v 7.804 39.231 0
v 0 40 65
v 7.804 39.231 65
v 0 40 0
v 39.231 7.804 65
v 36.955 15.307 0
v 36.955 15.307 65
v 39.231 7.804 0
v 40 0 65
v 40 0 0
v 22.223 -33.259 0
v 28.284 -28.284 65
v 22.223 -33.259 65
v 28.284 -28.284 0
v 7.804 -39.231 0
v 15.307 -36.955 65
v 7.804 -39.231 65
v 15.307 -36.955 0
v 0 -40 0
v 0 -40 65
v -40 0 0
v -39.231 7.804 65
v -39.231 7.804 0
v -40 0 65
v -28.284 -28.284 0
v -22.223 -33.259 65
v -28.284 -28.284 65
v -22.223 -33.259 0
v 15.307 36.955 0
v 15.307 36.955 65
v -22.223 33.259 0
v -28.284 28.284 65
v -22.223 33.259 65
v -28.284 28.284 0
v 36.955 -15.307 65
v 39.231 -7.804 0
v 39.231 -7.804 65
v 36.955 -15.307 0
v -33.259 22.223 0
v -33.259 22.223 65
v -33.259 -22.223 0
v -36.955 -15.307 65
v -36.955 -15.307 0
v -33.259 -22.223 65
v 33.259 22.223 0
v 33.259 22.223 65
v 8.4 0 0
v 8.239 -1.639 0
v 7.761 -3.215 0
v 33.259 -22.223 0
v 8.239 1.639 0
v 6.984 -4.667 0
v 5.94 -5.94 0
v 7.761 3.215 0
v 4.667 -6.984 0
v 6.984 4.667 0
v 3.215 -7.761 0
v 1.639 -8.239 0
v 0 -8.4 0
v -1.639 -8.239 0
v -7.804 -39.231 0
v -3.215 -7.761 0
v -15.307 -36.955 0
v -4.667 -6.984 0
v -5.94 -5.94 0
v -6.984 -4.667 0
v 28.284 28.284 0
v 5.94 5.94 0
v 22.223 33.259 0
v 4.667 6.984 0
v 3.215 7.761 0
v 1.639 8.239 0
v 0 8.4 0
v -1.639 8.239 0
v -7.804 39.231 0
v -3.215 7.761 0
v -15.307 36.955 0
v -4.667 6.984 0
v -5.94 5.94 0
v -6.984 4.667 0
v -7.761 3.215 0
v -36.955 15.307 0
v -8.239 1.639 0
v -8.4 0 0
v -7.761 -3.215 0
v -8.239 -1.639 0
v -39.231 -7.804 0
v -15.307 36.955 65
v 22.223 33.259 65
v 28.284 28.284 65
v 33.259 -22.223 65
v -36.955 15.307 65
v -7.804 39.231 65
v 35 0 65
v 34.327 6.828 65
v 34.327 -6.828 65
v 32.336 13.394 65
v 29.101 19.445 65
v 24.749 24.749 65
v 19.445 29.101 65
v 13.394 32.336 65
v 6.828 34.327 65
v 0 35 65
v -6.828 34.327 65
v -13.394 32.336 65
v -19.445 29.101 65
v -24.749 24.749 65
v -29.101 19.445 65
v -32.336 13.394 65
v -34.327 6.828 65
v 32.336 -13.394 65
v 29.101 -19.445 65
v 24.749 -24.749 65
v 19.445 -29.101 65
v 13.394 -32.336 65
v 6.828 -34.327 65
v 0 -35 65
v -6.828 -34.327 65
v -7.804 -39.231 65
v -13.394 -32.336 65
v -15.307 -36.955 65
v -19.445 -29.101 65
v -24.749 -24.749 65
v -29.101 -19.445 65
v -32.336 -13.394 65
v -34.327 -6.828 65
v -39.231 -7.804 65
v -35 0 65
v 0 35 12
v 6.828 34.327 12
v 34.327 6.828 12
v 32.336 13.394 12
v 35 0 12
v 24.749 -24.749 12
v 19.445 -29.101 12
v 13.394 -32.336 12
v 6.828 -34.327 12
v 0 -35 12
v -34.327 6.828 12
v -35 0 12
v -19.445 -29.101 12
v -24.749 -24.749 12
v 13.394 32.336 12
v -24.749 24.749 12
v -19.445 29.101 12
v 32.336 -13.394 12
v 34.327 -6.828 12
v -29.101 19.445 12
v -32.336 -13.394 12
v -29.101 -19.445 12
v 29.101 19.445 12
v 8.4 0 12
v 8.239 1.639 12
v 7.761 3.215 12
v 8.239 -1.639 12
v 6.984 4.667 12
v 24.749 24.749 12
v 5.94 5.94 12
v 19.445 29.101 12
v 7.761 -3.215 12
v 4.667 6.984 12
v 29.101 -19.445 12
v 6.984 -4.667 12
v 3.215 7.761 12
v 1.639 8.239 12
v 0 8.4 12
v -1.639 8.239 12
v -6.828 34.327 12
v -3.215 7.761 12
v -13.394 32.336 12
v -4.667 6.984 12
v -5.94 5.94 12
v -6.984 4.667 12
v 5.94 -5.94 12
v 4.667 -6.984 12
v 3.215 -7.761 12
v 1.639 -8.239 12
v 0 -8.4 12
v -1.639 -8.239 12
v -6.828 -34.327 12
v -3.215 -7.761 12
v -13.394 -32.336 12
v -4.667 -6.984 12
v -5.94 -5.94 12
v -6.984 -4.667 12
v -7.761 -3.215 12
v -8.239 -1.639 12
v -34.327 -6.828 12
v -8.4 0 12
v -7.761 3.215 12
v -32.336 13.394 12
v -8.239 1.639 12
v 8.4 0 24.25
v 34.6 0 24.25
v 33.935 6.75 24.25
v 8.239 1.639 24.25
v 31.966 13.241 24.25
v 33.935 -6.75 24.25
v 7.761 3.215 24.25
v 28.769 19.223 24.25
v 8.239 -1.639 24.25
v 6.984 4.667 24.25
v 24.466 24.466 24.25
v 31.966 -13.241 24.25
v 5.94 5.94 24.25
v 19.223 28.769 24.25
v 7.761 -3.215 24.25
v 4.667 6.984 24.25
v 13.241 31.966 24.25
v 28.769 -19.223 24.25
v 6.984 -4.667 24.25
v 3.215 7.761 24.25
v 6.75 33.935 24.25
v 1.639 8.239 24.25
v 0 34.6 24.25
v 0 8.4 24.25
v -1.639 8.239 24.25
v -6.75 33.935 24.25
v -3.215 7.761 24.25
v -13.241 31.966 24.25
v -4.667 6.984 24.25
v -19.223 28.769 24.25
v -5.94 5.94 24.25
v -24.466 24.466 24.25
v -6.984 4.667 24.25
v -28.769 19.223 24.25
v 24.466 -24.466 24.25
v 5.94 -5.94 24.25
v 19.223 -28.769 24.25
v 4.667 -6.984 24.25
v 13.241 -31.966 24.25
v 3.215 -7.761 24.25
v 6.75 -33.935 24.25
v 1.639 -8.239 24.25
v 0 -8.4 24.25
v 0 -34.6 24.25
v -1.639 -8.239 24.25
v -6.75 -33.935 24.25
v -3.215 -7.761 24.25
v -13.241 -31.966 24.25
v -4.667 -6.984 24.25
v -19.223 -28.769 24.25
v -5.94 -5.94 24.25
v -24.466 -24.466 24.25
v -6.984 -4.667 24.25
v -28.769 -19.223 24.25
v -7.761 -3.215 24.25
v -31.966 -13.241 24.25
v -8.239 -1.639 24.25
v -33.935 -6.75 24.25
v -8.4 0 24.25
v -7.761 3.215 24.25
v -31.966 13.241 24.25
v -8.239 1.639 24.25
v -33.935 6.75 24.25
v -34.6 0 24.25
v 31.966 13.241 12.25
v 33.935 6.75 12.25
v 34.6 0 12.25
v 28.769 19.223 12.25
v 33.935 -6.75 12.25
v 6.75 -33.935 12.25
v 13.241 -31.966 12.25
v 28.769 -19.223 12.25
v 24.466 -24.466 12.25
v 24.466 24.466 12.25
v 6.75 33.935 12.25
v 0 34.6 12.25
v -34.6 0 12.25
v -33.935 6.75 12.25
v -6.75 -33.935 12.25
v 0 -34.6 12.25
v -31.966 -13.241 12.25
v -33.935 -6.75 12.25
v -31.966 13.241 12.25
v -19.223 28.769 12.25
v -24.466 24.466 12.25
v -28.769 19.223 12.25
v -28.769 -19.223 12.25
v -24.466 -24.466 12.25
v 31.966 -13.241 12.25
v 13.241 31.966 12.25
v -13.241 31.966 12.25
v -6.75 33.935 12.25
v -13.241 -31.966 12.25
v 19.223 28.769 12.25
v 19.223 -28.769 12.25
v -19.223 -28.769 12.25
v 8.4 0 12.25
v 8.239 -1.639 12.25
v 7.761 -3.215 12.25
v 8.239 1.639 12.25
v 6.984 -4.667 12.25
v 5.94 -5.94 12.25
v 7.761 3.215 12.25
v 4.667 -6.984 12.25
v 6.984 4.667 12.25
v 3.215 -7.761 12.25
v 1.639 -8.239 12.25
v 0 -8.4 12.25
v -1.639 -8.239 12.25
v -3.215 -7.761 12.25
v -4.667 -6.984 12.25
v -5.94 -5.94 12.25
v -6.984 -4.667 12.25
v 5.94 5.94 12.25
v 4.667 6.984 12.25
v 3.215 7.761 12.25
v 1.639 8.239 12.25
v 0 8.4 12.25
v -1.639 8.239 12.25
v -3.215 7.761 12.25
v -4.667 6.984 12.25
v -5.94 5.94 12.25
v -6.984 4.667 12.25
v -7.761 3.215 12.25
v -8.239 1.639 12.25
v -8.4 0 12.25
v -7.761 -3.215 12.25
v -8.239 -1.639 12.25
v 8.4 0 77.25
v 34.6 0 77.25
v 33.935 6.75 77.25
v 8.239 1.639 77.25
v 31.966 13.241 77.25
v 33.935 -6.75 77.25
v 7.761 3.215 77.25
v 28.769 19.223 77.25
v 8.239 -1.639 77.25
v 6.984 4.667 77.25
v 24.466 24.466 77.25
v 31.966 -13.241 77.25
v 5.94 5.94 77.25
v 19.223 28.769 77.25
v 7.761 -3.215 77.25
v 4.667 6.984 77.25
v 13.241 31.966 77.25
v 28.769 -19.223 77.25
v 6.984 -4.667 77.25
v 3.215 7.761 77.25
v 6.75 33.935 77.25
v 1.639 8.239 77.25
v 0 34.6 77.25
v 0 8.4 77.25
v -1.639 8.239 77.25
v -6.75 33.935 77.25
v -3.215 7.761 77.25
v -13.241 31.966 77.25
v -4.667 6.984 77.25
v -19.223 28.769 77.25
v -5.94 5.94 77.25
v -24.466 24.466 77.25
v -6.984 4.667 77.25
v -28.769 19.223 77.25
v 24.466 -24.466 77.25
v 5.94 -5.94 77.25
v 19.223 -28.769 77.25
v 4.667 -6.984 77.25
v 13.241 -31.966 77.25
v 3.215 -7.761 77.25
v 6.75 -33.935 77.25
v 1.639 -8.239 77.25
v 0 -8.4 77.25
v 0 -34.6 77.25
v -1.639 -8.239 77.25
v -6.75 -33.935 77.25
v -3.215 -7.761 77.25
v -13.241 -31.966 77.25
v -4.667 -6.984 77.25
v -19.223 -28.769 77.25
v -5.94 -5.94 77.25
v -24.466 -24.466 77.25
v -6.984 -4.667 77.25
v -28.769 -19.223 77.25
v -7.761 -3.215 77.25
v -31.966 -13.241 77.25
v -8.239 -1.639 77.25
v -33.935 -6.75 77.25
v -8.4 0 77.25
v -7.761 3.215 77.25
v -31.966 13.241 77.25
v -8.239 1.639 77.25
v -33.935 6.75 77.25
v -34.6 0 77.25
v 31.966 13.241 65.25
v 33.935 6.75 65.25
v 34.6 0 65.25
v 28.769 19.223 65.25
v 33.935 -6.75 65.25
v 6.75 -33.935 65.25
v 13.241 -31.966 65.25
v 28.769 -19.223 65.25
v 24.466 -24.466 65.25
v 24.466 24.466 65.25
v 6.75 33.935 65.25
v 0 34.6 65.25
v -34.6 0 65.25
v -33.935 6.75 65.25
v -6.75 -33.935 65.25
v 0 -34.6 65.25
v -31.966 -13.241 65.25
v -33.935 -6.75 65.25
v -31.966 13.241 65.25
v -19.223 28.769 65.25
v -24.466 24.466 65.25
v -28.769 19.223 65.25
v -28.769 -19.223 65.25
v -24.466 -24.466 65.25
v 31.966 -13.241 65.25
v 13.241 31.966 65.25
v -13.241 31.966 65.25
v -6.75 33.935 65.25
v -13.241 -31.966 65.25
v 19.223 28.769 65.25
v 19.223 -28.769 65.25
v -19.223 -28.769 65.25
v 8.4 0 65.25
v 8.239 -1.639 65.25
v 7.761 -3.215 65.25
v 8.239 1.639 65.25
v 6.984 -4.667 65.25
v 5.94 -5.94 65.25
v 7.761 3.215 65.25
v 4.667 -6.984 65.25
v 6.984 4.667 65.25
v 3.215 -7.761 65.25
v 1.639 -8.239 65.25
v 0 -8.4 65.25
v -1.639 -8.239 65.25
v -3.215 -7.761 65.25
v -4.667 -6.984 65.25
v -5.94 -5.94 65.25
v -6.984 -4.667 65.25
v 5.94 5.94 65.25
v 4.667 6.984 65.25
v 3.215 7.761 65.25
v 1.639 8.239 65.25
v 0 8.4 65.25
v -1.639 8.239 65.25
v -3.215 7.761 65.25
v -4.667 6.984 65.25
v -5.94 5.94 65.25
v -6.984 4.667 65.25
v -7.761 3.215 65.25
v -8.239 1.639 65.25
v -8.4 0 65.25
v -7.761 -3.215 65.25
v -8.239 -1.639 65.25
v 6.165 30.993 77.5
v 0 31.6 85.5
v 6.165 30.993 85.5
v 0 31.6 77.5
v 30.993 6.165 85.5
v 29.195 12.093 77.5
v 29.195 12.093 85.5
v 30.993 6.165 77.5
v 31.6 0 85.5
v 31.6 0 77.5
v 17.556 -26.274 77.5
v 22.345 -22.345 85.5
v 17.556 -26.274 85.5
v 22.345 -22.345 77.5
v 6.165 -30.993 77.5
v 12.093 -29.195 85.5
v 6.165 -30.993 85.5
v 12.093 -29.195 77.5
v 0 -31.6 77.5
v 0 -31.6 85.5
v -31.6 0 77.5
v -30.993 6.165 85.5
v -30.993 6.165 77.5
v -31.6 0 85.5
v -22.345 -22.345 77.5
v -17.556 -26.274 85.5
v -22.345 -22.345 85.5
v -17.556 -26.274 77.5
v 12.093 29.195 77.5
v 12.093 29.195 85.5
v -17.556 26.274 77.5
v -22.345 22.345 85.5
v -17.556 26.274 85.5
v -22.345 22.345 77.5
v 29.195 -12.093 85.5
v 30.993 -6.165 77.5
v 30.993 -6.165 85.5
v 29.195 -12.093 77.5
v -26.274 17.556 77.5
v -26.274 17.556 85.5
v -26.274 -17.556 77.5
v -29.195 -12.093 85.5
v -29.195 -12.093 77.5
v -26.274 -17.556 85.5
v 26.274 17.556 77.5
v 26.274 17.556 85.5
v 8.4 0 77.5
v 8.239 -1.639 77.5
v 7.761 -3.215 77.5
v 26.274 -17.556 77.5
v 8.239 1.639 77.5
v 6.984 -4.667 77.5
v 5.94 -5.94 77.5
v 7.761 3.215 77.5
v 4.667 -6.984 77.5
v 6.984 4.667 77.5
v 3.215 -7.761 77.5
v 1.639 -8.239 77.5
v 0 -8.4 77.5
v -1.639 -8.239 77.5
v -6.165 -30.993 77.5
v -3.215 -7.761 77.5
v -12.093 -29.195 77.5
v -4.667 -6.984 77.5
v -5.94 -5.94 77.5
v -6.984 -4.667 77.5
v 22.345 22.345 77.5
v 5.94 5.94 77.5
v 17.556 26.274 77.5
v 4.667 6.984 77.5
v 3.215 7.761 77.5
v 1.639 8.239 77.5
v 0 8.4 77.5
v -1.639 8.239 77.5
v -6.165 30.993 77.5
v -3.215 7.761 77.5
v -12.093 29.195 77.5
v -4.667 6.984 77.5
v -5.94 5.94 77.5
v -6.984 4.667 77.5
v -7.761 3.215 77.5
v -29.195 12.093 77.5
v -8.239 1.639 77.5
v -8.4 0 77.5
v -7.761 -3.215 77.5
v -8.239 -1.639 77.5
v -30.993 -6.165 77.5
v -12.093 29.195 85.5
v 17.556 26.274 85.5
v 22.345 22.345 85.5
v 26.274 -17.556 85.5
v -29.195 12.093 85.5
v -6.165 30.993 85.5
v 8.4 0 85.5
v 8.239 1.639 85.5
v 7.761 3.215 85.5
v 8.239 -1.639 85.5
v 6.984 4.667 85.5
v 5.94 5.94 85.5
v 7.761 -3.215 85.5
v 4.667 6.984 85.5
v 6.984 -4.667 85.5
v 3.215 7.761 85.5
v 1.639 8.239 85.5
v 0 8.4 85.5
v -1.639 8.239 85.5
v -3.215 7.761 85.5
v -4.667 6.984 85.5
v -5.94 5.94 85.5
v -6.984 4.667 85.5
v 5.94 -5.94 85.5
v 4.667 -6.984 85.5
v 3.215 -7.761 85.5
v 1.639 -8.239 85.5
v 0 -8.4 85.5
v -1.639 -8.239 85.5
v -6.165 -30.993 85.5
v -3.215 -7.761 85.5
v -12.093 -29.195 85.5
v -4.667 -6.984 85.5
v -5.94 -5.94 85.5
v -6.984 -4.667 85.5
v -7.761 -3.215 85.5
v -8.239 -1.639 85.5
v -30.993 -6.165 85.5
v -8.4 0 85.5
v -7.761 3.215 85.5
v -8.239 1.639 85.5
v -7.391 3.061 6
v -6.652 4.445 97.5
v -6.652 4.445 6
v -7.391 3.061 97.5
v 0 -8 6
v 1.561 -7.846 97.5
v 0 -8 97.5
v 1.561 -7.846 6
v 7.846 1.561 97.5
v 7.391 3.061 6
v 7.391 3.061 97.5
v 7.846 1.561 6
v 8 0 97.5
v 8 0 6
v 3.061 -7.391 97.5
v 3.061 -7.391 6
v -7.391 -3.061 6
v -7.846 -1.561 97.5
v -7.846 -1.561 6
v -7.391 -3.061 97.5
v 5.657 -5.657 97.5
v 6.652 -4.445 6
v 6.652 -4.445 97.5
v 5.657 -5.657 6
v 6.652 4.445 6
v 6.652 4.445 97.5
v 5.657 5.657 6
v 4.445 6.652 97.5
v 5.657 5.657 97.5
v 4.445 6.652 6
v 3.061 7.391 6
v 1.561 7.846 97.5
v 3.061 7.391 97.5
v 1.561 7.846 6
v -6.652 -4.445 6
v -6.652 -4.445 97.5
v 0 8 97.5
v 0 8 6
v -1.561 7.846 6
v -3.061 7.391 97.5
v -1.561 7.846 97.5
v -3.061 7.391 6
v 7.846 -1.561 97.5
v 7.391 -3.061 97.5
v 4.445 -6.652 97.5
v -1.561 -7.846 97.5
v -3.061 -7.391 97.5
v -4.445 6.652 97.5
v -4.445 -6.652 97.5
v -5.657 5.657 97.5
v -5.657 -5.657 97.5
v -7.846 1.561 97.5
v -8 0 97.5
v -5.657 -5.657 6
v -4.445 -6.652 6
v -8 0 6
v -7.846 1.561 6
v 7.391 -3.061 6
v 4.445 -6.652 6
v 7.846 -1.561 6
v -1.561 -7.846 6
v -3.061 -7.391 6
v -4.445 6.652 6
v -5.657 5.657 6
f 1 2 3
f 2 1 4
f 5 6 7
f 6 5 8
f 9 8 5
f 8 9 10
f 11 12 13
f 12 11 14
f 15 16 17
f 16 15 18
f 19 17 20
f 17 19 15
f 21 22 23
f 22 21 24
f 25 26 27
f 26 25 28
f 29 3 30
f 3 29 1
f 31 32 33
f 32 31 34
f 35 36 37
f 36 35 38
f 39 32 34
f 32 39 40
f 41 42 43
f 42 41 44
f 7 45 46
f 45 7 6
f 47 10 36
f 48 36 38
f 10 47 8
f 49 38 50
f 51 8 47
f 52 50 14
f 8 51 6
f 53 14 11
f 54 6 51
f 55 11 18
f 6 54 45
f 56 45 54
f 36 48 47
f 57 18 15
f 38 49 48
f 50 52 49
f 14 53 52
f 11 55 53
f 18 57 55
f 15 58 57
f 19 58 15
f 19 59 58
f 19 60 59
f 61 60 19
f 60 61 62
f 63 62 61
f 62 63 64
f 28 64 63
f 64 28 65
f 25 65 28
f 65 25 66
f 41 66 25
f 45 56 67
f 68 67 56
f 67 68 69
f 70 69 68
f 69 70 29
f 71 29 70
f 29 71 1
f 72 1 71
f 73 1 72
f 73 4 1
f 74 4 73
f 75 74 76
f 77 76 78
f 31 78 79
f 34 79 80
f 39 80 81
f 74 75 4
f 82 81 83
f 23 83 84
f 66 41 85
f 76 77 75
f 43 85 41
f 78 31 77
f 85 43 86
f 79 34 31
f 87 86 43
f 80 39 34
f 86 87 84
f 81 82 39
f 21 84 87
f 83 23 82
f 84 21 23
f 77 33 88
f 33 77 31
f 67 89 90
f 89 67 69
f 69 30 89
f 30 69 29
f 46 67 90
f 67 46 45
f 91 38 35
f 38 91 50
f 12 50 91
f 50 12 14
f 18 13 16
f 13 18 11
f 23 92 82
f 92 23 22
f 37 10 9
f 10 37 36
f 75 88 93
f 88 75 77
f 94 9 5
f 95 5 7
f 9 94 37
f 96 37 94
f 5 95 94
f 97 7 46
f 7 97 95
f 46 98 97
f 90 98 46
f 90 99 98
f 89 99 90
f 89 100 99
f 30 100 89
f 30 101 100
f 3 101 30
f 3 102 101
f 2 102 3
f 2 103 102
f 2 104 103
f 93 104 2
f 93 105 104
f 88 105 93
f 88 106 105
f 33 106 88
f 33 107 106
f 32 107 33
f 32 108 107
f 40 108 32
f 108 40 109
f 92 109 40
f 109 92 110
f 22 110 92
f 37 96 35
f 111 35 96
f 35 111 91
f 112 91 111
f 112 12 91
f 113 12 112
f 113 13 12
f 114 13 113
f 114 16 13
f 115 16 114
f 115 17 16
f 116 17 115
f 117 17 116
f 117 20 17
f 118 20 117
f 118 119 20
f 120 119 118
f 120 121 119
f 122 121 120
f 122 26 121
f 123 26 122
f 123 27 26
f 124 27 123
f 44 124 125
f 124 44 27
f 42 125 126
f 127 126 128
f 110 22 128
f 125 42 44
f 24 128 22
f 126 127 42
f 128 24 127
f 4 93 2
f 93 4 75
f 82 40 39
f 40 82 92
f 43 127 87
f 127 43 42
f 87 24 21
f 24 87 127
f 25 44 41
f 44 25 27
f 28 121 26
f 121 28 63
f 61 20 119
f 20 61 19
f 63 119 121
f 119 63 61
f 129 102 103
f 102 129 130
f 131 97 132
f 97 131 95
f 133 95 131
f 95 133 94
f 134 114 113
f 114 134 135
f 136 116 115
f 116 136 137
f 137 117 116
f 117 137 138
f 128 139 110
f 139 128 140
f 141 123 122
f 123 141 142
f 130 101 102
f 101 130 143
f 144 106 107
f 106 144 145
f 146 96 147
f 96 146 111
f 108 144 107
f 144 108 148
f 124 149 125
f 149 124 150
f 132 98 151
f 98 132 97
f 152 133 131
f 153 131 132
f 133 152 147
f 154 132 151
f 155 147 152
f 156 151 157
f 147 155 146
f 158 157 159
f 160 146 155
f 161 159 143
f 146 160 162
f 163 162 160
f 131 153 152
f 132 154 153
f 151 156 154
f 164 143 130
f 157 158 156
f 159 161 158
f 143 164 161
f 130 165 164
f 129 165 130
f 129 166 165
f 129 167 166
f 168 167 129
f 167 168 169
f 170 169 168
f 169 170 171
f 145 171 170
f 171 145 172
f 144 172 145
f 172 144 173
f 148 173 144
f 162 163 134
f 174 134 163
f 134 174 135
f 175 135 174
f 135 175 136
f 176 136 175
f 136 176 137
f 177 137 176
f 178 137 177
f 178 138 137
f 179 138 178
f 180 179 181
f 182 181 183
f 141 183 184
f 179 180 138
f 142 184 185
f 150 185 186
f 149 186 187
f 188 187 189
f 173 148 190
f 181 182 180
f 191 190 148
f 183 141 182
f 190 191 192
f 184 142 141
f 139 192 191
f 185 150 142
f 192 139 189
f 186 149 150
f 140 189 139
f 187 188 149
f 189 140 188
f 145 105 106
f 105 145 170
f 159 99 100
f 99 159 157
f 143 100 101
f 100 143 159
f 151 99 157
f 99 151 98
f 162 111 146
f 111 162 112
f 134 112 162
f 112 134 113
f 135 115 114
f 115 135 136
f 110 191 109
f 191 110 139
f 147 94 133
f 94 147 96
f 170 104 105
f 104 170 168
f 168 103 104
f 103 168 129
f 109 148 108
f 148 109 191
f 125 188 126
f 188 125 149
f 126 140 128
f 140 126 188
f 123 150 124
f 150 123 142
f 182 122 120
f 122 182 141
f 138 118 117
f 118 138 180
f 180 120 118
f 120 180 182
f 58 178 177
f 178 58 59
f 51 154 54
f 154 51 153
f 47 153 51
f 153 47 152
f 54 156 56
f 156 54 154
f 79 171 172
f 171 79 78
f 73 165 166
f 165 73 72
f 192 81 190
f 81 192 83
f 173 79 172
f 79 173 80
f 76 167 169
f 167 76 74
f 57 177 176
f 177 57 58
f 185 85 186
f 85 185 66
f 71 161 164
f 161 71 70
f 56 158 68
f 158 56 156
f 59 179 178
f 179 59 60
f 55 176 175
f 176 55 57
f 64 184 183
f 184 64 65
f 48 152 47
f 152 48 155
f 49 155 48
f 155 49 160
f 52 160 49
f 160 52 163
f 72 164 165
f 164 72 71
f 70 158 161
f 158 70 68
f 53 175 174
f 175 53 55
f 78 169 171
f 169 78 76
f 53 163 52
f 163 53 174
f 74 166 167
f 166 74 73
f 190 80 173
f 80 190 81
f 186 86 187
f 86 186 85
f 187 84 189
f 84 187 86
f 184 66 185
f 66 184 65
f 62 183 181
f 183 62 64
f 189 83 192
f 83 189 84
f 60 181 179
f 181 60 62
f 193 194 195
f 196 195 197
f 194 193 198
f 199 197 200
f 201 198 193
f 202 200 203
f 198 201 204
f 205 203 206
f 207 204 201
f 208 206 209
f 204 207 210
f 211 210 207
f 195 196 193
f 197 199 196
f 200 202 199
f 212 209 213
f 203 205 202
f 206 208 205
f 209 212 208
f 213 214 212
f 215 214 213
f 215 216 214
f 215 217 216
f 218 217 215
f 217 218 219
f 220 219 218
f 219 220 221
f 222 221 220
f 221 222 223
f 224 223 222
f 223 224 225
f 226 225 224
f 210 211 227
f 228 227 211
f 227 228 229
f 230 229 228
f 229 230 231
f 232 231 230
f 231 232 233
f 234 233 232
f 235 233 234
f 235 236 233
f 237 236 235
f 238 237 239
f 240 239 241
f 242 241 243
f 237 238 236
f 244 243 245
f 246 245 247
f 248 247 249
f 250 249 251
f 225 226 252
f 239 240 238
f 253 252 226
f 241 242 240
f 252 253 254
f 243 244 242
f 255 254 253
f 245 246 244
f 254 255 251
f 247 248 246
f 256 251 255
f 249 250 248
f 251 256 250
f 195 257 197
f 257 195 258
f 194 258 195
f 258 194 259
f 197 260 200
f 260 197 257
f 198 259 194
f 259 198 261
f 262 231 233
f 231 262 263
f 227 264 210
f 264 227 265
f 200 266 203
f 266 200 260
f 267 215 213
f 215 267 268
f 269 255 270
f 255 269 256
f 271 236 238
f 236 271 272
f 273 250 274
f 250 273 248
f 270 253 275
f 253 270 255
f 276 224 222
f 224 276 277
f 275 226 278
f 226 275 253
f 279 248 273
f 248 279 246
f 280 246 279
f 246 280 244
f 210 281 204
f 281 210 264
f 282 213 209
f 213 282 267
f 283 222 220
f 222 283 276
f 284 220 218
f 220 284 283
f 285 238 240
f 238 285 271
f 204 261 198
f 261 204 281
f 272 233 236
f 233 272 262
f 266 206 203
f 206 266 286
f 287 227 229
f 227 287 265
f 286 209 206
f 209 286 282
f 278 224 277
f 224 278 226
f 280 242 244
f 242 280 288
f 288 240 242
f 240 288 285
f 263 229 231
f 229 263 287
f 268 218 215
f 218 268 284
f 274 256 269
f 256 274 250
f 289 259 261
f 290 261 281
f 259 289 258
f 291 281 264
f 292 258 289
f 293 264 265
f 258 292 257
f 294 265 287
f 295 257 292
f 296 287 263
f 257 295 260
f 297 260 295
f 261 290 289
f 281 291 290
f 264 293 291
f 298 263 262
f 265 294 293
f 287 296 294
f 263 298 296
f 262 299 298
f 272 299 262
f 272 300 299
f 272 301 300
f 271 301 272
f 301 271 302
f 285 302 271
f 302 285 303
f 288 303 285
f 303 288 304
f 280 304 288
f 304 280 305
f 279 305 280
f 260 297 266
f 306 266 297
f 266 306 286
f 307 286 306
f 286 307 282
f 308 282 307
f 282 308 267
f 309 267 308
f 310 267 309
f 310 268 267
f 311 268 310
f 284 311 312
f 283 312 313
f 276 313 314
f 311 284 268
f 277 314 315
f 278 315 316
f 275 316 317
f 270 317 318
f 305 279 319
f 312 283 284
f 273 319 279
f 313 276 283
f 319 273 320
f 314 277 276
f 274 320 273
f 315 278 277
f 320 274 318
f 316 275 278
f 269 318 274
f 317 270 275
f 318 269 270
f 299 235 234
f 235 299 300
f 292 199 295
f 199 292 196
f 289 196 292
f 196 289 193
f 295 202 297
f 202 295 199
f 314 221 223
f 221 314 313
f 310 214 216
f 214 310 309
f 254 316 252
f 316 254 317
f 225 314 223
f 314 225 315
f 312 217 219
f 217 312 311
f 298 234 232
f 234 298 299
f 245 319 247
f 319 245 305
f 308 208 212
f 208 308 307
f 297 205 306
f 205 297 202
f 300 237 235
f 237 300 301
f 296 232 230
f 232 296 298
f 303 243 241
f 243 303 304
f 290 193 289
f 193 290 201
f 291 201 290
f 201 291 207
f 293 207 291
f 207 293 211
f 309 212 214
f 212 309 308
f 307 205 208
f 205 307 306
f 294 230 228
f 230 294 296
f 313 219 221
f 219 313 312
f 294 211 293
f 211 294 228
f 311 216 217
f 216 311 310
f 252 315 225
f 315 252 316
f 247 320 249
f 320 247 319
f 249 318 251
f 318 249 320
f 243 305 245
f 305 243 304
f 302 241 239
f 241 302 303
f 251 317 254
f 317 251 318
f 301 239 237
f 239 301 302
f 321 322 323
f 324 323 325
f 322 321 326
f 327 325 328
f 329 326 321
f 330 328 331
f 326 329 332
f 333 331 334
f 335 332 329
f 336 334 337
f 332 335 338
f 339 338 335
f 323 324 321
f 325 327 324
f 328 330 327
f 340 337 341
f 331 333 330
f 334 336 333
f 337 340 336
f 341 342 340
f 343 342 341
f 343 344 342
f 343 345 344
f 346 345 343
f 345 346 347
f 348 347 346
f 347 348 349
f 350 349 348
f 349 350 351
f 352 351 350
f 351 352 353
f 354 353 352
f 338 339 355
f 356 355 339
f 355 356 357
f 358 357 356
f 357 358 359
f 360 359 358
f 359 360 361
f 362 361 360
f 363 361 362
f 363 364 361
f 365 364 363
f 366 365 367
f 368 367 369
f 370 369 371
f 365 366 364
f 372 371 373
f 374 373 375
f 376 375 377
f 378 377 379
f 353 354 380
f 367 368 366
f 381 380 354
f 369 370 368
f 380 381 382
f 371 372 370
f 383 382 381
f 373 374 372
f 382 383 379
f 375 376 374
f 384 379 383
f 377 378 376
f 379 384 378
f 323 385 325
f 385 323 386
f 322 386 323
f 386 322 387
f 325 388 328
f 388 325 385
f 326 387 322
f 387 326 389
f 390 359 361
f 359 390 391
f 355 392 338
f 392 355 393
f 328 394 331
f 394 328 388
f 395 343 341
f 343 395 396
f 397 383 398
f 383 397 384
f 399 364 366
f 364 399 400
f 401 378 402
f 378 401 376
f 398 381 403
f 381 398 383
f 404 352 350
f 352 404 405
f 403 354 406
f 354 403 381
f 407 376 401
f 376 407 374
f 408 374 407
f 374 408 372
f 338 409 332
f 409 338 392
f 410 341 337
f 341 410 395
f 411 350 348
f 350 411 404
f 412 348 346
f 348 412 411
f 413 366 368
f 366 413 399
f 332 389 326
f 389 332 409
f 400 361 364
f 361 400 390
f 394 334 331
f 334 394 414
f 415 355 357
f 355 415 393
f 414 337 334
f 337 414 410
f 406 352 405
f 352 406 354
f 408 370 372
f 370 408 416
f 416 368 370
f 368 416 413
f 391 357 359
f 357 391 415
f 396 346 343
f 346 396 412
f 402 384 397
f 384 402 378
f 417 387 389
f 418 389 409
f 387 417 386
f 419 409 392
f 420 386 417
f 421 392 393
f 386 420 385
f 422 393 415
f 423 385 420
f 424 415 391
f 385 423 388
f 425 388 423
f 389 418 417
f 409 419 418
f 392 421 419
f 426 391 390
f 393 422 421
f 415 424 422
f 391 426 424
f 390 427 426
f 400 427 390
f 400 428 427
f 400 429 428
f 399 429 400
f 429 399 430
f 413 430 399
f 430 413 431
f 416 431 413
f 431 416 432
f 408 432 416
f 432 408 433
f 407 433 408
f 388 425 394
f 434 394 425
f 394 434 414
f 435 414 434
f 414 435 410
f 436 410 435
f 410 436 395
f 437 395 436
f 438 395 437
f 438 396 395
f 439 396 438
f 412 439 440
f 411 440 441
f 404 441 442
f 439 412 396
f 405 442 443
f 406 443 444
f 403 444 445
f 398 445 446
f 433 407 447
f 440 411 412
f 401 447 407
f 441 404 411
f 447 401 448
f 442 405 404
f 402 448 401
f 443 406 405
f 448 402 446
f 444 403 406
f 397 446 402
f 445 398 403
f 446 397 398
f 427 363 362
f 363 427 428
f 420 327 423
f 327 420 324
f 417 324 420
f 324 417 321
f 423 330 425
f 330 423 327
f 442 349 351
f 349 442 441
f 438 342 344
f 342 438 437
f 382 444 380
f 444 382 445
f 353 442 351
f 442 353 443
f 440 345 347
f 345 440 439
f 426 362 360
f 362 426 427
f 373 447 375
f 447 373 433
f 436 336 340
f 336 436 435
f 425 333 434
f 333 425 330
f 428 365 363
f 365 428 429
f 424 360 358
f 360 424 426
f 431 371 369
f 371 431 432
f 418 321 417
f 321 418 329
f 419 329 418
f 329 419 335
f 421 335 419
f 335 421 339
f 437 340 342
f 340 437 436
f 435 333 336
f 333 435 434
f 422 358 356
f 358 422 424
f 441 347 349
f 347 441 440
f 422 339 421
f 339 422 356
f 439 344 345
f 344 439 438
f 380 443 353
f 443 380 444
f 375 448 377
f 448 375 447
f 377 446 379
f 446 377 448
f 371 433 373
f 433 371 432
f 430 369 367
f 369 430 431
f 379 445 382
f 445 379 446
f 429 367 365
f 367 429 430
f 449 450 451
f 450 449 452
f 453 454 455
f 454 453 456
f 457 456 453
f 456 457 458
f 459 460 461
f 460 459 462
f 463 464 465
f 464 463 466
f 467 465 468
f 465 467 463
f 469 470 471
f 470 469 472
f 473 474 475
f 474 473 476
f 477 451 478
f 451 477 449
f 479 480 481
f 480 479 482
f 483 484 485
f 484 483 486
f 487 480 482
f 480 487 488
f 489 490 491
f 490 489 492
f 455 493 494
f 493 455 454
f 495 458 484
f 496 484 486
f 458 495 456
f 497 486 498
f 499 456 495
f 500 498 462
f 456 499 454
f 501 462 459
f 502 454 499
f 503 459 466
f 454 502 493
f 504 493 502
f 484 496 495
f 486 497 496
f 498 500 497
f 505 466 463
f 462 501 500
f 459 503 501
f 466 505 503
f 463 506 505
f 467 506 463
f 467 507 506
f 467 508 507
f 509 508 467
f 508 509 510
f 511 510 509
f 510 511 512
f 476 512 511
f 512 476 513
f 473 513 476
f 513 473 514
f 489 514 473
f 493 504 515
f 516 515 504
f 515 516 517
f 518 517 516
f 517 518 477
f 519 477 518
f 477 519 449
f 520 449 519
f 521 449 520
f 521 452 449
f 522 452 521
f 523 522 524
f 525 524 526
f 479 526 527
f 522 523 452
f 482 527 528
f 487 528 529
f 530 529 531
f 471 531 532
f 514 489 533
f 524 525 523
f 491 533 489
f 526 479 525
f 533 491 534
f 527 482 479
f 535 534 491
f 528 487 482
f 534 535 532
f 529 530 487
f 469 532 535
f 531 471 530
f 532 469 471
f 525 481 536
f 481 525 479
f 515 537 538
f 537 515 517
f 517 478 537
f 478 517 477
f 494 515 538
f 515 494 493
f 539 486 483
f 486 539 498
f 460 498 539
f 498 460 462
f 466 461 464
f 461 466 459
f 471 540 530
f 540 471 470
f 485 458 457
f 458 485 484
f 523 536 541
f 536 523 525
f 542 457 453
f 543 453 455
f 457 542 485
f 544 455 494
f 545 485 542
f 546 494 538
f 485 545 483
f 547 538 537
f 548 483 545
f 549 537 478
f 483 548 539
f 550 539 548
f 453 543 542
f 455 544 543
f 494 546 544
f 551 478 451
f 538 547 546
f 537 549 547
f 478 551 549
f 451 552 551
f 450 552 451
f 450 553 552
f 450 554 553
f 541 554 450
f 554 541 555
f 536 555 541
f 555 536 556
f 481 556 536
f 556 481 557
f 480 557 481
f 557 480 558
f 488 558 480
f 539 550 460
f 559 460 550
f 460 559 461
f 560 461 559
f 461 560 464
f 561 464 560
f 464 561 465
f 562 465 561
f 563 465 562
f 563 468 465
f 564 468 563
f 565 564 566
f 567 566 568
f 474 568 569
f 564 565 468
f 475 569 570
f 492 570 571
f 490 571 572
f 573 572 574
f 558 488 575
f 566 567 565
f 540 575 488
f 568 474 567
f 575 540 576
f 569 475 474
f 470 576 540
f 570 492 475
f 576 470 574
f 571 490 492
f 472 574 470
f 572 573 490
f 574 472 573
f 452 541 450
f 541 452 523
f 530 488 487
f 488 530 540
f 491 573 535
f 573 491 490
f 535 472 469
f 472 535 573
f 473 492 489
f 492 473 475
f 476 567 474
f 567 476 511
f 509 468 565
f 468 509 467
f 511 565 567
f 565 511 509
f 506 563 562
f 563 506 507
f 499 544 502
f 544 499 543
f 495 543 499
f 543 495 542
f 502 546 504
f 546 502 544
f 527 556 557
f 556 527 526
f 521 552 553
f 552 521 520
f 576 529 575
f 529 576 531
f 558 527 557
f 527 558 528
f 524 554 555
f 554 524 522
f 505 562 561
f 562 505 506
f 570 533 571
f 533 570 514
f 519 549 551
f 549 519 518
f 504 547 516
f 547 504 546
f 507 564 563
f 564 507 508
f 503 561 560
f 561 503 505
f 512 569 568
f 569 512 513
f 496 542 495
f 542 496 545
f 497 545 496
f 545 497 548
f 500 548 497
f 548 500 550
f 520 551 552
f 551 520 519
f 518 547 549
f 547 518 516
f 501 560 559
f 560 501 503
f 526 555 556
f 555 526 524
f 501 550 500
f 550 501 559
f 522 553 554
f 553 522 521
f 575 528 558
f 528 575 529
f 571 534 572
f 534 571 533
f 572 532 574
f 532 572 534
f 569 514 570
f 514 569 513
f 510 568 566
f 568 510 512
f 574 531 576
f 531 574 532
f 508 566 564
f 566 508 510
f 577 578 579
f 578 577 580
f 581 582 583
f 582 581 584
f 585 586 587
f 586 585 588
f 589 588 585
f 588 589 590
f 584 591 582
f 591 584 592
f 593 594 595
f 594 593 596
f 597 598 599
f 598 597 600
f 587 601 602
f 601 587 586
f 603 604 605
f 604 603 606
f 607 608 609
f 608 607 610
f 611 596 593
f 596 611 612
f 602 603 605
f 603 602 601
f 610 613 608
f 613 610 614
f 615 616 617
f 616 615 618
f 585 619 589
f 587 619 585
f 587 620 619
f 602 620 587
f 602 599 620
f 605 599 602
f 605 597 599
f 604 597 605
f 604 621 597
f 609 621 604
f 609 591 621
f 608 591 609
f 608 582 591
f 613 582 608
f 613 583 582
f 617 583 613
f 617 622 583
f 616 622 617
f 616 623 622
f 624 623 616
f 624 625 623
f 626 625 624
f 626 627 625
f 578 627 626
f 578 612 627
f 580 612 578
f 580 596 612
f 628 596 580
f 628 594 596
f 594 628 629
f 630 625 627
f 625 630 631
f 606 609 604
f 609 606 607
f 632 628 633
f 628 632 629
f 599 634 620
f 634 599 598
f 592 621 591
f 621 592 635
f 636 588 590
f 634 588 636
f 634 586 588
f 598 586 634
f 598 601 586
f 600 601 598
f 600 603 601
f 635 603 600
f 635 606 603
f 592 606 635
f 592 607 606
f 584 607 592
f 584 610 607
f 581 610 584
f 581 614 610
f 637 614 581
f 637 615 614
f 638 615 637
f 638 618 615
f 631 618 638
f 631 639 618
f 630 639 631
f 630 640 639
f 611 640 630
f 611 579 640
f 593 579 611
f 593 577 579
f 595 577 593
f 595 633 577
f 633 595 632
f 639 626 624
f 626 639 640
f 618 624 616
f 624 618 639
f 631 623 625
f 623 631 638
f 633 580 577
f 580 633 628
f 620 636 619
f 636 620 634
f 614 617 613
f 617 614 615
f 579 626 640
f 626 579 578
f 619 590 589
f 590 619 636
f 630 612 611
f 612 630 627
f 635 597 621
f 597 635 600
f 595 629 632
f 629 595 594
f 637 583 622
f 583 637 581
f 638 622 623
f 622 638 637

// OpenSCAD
$fn = 32;

// ------------------------------------------------------------------------
// Bearing housing: housing d80, two bearings and a shaft
// Every part is its own module, assembly() places them once.
// ------------------------------------------------------------------------

// --- part 1 ---
module housing() {
  difference() {
    cylinder(h = 65, d = 80);
    translate([0, 0, 12]) cylinder(h = 54, d = 70);
    translate([0, 0, -1]) cylinder(h = 14, d = 16.8);
  }
}

// --- part 2 ---
module bearing_lower() {
  difference() {
      translate([0, 0, 0]) cylinder(h = 12, d = 69.2);
      translate([0, 0, -1]) cylinder(h = 14, d = 16.8);
    }
}

// --- part 3 ---
module bearing_upper() {
  difference() {
      translate([0, 0, 0]) cylinder(h = 12, d = 69.2);
      translate([0, 0, -1]) cylinder(h = 14, d = 16.8);
    }
}

// --- part 4 ---
module spacer() {
  difference() {
      translate([0, 0, 0]) cylinder(h = 8, d = 63.2);
      translate([0, 0, -1]) cylinder(h = 10, d = 16.8);
    }
}

// --- part 5 ---
module shaft() {
  translate([0, 0, -45.75]) cylinder(h = 91.5, d = 16);
}

// --- assembly ---
module assembly() {
  translate([0, 0, 0]) rotate([0, 0, 0]) housing();
  translate([0, 0, 12.25]) rotate([0, 0, 0]) bearing_lower();
  translate([0, 0, 65.25]) rotate([0, 0, 0]) bearing_upper();
  translate([0, 0, 77.5]) rotate([0, 0, 0]) spacer();
  translate([0, 0, 51.75]) rotate([0, 0, 0]) shaft();
}

assembly();
